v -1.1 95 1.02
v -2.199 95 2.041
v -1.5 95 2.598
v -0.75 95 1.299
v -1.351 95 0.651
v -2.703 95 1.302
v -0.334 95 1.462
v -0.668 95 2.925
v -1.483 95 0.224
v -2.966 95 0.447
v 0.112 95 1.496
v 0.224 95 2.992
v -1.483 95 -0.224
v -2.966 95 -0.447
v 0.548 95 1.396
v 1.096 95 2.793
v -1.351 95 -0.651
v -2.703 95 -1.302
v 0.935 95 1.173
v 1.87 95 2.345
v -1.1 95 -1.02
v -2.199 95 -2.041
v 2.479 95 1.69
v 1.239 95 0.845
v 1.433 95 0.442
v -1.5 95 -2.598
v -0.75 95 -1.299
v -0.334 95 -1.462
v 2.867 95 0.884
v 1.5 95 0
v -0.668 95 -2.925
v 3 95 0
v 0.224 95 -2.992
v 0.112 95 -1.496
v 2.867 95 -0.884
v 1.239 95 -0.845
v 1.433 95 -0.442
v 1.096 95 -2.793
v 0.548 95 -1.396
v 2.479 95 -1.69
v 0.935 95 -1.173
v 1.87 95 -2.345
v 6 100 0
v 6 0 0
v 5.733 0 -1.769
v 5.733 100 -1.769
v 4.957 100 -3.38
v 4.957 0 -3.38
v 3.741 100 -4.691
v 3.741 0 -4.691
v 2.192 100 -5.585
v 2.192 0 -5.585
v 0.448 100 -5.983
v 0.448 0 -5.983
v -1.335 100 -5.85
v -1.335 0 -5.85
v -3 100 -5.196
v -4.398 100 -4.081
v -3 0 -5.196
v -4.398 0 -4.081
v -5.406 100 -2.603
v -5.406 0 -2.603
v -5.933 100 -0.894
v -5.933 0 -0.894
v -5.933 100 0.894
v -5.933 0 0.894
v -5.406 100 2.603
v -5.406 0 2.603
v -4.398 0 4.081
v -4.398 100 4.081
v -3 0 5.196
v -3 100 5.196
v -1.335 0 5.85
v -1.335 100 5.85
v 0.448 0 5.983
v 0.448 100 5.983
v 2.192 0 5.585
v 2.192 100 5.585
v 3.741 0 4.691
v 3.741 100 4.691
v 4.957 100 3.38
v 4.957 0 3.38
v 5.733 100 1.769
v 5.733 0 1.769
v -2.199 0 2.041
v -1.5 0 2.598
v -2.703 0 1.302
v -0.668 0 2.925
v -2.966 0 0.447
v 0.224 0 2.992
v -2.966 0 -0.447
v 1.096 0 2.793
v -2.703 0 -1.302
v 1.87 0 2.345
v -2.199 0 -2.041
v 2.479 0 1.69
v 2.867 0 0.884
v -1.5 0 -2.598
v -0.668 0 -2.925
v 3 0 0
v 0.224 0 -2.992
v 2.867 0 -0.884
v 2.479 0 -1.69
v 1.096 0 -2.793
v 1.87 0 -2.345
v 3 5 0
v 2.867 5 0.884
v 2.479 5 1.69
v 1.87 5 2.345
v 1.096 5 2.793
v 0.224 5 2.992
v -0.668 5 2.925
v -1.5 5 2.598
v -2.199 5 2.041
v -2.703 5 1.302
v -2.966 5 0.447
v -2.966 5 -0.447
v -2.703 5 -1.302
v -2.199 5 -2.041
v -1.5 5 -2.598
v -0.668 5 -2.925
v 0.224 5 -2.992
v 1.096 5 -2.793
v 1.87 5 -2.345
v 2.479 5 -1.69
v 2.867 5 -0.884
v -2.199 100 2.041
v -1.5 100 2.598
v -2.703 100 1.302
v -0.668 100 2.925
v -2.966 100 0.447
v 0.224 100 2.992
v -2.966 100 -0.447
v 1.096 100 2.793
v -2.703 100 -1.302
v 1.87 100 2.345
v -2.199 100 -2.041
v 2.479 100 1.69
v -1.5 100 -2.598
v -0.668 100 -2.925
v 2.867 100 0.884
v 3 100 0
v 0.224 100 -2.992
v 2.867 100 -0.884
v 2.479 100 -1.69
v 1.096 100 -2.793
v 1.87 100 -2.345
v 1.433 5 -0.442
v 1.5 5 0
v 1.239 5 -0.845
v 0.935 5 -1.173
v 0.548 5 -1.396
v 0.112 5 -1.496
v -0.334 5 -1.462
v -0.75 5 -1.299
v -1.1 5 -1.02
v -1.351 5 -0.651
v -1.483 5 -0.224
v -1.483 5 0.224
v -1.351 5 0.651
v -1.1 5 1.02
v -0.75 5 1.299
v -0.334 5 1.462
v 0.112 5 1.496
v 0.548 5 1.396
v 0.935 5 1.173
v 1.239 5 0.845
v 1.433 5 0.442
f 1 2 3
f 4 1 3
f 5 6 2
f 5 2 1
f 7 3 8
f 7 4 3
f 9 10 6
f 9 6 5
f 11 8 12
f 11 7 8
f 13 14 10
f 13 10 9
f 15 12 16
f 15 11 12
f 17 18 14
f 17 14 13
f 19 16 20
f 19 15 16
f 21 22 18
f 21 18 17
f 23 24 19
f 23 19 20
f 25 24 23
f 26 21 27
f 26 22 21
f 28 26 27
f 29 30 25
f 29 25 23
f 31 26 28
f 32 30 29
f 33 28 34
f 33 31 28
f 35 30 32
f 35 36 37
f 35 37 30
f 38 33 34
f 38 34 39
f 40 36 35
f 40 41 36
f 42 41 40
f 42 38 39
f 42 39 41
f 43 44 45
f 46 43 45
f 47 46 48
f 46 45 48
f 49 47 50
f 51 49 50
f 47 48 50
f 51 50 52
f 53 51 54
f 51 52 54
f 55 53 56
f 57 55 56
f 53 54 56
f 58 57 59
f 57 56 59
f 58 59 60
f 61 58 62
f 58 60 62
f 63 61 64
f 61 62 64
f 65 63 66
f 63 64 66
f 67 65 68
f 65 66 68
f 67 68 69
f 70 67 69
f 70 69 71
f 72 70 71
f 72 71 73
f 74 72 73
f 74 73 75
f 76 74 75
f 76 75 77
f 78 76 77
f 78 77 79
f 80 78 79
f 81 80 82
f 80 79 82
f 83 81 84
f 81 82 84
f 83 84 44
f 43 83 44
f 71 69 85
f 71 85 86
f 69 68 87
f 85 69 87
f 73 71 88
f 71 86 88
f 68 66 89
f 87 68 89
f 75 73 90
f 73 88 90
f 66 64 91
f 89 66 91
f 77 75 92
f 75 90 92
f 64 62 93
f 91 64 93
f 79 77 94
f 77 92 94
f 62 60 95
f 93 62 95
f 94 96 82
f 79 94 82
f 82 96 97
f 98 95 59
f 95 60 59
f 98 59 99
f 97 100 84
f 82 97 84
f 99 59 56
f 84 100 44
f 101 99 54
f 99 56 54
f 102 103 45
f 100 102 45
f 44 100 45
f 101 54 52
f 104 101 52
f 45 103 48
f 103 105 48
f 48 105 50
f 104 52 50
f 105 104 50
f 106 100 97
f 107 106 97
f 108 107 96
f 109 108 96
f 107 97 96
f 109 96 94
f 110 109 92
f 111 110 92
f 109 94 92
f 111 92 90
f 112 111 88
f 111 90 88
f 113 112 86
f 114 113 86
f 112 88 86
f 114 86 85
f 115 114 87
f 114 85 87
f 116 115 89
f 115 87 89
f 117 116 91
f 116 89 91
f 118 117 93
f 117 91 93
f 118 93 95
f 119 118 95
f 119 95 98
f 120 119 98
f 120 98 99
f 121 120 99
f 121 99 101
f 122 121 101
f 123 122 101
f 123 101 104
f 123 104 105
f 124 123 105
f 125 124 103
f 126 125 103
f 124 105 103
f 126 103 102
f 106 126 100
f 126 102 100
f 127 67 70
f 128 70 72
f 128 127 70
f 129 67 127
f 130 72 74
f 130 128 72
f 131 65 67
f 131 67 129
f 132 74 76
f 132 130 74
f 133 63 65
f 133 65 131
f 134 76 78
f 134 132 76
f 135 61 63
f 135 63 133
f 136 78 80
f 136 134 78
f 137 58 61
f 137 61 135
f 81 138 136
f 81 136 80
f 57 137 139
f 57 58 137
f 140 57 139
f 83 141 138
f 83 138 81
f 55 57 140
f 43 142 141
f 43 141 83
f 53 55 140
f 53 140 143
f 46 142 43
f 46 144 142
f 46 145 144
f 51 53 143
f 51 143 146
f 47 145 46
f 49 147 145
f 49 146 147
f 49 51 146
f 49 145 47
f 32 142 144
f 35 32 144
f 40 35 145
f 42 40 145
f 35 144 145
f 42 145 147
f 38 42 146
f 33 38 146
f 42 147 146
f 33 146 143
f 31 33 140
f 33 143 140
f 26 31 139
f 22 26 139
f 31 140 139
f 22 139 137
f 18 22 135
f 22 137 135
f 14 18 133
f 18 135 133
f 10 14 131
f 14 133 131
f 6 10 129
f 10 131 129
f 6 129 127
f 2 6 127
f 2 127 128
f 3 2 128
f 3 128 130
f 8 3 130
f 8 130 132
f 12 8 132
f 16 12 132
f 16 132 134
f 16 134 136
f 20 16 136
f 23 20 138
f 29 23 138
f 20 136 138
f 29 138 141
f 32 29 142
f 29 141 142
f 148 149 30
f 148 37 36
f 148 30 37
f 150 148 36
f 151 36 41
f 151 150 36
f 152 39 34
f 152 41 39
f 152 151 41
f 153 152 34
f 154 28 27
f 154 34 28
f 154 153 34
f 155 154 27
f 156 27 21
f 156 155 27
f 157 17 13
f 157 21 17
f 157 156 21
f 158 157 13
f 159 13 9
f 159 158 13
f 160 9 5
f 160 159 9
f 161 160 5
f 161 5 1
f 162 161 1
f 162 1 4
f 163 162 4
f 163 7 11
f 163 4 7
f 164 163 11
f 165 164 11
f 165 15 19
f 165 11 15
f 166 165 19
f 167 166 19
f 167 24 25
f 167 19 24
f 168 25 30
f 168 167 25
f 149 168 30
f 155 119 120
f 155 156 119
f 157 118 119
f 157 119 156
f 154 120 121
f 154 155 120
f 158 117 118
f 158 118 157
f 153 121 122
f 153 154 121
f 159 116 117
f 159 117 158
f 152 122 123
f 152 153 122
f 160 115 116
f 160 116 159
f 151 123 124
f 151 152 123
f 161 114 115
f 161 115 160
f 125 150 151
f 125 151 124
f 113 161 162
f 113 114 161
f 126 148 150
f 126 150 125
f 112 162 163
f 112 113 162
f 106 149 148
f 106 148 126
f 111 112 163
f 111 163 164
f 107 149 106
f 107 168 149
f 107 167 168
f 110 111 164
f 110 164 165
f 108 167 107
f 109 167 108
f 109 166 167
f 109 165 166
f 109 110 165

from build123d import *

# Parameters (mm, degrees)
SKETCH1_R           = 6
SKETCH1_R_2         = 1.5
BOSS_EXTRUDE1_DEPTH = 100
SKETCH2_R           = 3
CUT_EXTRUDE1_DEPTH  = 5
SKETCH3_R           = 3
CUT_EXTRUDE2_DEPTH  = 5


with BuildPart() as part:
    # Sketch1 → Boss-Extrude1 (new body)
    with BuildSketch(Plane(origin=(0, 0, 0), x_dir=(1, 0, 0), z_dir=(0, 1, 0))):
        Circle(SKETCH1_R)
        Circle(SKETCH1_R_2, mode=Mode.SUBTRACT)
    extrude(amount=BOSS_EXTRUDE1_DEPTH)

    # Sketch2 → Cut-Extrude1 (cut)
    with BuildSketch(Plane(origin=(0, 100, 0), x_dir=(1, 0, 0), z_dir=(0, 1, 0))):
        Circle(SKETCH2_R)
    extrude(amount=-CUT_EXTRUDE1_DEPTH, mode=Mode.SUBTRACT)

    # Sketch3 → Cut-Extrude2 (cut)
    with BuildSketch(Plane.XZ):
        Circle(SKETCH3_R)
    extrude(amount=-CUT_EXTRUDE2_DEPTH, mode=Mode.SUBTRACT)


solid = part.part
